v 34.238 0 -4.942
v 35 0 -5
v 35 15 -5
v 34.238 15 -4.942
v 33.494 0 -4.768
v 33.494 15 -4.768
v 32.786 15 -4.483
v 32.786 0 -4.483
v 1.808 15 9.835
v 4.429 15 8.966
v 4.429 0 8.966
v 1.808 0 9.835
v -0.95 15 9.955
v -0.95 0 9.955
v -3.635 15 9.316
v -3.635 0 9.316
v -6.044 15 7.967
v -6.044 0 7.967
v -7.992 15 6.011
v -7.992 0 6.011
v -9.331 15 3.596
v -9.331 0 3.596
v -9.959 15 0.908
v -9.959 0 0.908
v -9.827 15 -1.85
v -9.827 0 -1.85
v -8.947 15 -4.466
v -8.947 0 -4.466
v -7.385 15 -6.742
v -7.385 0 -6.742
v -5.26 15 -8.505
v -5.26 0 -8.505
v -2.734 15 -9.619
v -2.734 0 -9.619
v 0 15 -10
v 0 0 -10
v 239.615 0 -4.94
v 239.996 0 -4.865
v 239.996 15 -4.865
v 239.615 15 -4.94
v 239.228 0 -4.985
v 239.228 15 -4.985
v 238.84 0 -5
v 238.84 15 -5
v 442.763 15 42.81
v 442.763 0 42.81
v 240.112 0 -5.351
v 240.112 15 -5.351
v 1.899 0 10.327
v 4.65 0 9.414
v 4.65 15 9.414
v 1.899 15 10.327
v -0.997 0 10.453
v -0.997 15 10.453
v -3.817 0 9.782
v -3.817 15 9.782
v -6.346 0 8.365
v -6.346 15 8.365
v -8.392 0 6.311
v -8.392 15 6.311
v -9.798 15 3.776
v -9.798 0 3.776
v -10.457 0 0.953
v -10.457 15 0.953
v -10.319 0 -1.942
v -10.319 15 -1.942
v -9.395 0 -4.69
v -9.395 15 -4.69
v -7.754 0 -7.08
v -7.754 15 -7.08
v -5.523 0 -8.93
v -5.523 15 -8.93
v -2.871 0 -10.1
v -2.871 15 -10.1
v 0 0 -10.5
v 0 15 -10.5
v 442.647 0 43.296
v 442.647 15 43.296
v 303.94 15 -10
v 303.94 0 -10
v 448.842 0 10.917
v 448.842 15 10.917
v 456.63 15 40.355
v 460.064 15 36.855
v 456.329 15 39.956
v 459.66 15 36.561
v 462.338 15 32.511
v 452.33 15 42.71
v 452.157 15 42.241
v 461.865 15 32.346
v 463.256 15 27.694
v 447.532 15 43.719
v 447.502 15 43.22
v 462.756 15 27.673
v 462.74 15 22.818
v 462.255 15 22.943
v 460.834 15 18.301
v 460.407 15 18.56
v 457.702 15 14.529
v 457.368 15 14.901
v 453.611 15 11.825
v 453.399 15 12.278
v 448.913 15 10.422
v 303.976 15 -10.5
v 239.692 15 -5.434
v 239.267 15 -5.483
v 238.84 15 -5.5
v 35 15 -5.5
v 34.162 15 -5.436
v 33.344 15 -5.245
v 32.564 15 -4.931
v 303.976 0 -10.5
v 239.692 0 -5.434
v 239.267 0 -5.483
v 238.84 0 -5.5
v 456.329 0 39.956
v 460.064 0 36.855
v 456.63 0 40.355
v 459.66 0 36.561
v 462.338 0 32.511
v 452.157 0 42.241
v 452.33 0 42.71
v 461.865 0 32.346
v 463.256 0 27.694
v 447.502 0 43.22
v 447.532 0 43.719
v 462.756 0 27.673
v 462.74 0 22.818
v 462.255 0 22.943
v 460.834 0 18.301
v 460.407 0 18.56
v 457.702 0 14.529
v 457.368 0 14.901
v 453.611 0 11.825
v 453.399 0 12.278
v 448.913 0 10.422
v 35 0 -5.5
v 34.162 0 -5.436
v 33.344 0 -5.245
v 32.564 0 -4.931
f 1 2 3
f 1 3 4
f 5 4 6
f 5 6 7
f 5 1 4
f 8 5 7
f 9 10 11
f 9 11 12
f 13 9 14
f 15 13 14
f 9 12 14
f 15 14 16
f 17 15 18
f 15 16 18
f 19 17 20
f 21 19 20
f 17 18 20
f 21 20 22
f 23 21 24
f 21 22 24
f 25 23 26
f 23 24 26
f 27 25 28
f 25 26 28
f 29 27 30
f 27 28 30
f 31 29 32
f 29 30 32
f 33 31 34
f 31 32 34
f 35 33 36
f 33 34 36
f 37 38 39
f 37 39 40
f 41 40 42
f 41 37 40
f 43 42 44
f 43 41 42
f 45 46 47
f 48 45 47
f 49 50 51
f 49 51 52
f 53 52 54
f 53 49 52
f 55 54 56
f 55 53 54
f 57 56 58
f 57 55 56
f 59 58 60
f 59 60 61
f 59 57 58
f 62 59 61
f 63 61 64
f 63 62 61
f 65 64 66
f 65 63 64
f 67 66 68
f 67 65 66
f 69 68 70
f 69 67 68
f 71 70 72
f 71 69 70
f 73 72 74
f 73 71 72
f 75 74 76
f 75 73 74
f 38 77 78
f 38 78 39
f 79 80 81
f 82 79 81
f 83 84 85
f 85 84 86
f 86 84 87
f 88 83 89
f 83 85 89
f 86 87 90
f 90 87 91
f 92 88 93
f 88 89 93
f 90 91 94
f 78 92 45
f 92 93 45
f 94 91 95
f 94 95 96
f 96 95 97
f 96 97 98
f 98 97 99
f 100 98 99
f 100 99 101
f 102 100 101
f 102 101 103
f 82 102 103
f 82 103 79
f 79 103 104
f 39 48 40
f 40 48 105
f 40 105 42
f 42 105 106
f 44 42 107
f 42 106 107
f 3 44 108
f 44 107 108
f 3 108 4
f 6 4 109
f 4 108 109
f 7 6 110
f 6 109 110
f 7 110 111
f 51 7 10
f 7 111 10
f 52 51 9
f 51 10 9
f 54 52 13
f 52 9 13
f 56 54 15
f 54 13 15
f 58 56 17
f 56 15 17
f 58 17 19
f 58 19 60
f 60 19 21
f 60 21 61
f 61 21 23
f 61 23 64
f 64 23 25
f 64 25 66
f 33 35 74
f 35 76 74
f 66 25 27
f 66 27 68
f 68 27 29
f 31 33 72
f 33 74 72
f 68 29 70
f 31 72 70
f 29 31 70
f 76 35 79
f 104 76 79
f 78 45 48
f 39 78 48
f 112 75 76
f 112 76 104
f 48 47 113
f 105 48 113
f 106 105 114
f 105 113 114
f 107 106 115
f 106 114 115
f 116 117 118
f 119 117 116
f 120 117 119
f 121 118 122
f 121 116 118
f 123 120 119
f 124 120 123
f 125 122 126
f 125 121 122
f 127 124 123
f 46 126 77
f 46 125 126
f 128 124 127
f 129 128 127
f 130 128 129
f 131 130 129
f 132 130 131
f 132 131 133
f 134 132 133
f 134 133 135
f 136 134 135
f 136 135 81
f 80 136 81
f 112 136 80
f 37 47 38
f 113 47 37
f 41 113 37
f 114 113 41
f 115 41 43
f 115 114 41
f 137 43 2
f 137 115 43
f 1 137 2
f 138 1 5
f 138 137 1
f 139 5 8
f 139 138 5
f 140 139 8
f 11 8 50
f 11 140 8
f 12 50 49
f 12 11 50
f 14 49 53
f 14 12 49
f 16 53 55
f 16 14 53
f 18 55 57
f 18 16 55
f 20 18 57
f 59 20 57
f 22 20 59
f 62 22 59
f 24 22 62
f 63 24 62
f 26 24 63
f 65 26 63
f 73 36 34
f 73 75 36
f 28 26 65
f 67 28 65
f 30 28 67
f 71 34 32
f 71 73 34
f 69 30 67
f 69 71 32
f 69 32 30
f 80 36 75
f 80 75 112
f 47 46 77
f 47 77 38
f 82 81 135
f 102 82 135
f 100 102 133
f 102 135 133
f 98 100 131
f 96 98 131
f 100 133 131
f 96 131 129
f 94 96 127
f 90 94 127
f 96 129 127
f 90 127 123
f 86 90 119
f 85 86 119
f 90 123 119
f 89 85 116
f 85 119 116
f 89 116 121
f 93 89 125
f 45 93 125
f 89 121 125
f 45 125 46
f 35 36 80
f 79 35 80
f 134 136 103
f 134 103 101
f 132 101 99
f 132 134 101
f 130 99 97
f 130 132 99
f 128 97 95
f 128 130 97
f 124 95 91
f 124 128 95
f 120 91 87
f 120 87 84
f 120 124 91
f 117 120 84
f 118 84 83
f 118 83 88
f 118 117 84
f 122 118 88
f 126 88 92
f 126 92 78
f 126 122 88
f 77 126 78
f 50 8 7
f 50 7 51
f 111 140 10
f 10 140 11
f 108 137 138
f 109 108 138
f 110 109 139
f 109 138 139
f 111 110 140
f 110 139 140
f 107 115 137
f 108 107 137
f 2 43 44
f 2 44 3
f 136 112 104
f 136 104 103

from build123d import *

# Parameters (mm, degrees)
BOSS_EXTRUDE1_DEPTH = 15


with BuildPart() as part:
    # Sketch2 → Boss-Extrude1 (new body)
    with BuildSketch(Plane(origin=(0, 0, 0), x_dir=(1, 0, 0), z_dir=(0, 1, 0))):
        with BuildLine():
            Line((0, 10.5), (303.9759017, 10.5))
            Line((303.9759017, 10.5), (448.913075843, -10.421830981))
            ThreePointArc((448.913075843, -10.421830981), (462.973791064, -30.136121747), (442.647176825, -43.296126554))
            Line((442.647176825, -43.296126554), (239.996066619, 4.864515389))
            ThreePointArc((239.996066619, 4.864515389), (239.421989284, 4.966013338), (238.84, 5))
            Line((238.84, 5), (35, 5))
            ThreePointArc((35, 5), (33.863075353, 4.869024784), (32.785714286, 4.482960938))
            Line((32.785714286, 4.482960938), (4.65, -9.414217971))
            ThreePointArc((4.65, -9.414217971), (-10.224952046, -2.38754176), (0, 10.5))
        make_face()
        with BuildLine():
            Line((0, 10), (303.94, 10))
            Line((303.94, 10), (448.841640743, -10.916701698))
            ThreePointArc((448.841640743, -10.916701698), (462.482633122, -30.042506173), (442.762783487, -42.809675015))
            Line((442.762783487, -42.809675015), (240.111673281, 5.350966928))
            ThreePointArc((240.111673281, 5.350966928), (239.480188213, 5.462614672), (238.84, 5.5))
            Line((238.84, 5.5), (35, 5.5))
            ThreePointArc((35, 5.5), (33.749382888, 5.355927262), (32.564285714, 4.931257032))
            Line((32.564285714, 4.931257032), (4.428571429, -8.965921877))
            ThreePointArc((4.428571429, -8.965921877), (-9.738049568, -2.273849295), (0, 10))
        make_face(mode=Mode.SUBTRACT)
    extrude(amount=BOSS_EXTRUDE1_DEPTH)


solid = part.part
